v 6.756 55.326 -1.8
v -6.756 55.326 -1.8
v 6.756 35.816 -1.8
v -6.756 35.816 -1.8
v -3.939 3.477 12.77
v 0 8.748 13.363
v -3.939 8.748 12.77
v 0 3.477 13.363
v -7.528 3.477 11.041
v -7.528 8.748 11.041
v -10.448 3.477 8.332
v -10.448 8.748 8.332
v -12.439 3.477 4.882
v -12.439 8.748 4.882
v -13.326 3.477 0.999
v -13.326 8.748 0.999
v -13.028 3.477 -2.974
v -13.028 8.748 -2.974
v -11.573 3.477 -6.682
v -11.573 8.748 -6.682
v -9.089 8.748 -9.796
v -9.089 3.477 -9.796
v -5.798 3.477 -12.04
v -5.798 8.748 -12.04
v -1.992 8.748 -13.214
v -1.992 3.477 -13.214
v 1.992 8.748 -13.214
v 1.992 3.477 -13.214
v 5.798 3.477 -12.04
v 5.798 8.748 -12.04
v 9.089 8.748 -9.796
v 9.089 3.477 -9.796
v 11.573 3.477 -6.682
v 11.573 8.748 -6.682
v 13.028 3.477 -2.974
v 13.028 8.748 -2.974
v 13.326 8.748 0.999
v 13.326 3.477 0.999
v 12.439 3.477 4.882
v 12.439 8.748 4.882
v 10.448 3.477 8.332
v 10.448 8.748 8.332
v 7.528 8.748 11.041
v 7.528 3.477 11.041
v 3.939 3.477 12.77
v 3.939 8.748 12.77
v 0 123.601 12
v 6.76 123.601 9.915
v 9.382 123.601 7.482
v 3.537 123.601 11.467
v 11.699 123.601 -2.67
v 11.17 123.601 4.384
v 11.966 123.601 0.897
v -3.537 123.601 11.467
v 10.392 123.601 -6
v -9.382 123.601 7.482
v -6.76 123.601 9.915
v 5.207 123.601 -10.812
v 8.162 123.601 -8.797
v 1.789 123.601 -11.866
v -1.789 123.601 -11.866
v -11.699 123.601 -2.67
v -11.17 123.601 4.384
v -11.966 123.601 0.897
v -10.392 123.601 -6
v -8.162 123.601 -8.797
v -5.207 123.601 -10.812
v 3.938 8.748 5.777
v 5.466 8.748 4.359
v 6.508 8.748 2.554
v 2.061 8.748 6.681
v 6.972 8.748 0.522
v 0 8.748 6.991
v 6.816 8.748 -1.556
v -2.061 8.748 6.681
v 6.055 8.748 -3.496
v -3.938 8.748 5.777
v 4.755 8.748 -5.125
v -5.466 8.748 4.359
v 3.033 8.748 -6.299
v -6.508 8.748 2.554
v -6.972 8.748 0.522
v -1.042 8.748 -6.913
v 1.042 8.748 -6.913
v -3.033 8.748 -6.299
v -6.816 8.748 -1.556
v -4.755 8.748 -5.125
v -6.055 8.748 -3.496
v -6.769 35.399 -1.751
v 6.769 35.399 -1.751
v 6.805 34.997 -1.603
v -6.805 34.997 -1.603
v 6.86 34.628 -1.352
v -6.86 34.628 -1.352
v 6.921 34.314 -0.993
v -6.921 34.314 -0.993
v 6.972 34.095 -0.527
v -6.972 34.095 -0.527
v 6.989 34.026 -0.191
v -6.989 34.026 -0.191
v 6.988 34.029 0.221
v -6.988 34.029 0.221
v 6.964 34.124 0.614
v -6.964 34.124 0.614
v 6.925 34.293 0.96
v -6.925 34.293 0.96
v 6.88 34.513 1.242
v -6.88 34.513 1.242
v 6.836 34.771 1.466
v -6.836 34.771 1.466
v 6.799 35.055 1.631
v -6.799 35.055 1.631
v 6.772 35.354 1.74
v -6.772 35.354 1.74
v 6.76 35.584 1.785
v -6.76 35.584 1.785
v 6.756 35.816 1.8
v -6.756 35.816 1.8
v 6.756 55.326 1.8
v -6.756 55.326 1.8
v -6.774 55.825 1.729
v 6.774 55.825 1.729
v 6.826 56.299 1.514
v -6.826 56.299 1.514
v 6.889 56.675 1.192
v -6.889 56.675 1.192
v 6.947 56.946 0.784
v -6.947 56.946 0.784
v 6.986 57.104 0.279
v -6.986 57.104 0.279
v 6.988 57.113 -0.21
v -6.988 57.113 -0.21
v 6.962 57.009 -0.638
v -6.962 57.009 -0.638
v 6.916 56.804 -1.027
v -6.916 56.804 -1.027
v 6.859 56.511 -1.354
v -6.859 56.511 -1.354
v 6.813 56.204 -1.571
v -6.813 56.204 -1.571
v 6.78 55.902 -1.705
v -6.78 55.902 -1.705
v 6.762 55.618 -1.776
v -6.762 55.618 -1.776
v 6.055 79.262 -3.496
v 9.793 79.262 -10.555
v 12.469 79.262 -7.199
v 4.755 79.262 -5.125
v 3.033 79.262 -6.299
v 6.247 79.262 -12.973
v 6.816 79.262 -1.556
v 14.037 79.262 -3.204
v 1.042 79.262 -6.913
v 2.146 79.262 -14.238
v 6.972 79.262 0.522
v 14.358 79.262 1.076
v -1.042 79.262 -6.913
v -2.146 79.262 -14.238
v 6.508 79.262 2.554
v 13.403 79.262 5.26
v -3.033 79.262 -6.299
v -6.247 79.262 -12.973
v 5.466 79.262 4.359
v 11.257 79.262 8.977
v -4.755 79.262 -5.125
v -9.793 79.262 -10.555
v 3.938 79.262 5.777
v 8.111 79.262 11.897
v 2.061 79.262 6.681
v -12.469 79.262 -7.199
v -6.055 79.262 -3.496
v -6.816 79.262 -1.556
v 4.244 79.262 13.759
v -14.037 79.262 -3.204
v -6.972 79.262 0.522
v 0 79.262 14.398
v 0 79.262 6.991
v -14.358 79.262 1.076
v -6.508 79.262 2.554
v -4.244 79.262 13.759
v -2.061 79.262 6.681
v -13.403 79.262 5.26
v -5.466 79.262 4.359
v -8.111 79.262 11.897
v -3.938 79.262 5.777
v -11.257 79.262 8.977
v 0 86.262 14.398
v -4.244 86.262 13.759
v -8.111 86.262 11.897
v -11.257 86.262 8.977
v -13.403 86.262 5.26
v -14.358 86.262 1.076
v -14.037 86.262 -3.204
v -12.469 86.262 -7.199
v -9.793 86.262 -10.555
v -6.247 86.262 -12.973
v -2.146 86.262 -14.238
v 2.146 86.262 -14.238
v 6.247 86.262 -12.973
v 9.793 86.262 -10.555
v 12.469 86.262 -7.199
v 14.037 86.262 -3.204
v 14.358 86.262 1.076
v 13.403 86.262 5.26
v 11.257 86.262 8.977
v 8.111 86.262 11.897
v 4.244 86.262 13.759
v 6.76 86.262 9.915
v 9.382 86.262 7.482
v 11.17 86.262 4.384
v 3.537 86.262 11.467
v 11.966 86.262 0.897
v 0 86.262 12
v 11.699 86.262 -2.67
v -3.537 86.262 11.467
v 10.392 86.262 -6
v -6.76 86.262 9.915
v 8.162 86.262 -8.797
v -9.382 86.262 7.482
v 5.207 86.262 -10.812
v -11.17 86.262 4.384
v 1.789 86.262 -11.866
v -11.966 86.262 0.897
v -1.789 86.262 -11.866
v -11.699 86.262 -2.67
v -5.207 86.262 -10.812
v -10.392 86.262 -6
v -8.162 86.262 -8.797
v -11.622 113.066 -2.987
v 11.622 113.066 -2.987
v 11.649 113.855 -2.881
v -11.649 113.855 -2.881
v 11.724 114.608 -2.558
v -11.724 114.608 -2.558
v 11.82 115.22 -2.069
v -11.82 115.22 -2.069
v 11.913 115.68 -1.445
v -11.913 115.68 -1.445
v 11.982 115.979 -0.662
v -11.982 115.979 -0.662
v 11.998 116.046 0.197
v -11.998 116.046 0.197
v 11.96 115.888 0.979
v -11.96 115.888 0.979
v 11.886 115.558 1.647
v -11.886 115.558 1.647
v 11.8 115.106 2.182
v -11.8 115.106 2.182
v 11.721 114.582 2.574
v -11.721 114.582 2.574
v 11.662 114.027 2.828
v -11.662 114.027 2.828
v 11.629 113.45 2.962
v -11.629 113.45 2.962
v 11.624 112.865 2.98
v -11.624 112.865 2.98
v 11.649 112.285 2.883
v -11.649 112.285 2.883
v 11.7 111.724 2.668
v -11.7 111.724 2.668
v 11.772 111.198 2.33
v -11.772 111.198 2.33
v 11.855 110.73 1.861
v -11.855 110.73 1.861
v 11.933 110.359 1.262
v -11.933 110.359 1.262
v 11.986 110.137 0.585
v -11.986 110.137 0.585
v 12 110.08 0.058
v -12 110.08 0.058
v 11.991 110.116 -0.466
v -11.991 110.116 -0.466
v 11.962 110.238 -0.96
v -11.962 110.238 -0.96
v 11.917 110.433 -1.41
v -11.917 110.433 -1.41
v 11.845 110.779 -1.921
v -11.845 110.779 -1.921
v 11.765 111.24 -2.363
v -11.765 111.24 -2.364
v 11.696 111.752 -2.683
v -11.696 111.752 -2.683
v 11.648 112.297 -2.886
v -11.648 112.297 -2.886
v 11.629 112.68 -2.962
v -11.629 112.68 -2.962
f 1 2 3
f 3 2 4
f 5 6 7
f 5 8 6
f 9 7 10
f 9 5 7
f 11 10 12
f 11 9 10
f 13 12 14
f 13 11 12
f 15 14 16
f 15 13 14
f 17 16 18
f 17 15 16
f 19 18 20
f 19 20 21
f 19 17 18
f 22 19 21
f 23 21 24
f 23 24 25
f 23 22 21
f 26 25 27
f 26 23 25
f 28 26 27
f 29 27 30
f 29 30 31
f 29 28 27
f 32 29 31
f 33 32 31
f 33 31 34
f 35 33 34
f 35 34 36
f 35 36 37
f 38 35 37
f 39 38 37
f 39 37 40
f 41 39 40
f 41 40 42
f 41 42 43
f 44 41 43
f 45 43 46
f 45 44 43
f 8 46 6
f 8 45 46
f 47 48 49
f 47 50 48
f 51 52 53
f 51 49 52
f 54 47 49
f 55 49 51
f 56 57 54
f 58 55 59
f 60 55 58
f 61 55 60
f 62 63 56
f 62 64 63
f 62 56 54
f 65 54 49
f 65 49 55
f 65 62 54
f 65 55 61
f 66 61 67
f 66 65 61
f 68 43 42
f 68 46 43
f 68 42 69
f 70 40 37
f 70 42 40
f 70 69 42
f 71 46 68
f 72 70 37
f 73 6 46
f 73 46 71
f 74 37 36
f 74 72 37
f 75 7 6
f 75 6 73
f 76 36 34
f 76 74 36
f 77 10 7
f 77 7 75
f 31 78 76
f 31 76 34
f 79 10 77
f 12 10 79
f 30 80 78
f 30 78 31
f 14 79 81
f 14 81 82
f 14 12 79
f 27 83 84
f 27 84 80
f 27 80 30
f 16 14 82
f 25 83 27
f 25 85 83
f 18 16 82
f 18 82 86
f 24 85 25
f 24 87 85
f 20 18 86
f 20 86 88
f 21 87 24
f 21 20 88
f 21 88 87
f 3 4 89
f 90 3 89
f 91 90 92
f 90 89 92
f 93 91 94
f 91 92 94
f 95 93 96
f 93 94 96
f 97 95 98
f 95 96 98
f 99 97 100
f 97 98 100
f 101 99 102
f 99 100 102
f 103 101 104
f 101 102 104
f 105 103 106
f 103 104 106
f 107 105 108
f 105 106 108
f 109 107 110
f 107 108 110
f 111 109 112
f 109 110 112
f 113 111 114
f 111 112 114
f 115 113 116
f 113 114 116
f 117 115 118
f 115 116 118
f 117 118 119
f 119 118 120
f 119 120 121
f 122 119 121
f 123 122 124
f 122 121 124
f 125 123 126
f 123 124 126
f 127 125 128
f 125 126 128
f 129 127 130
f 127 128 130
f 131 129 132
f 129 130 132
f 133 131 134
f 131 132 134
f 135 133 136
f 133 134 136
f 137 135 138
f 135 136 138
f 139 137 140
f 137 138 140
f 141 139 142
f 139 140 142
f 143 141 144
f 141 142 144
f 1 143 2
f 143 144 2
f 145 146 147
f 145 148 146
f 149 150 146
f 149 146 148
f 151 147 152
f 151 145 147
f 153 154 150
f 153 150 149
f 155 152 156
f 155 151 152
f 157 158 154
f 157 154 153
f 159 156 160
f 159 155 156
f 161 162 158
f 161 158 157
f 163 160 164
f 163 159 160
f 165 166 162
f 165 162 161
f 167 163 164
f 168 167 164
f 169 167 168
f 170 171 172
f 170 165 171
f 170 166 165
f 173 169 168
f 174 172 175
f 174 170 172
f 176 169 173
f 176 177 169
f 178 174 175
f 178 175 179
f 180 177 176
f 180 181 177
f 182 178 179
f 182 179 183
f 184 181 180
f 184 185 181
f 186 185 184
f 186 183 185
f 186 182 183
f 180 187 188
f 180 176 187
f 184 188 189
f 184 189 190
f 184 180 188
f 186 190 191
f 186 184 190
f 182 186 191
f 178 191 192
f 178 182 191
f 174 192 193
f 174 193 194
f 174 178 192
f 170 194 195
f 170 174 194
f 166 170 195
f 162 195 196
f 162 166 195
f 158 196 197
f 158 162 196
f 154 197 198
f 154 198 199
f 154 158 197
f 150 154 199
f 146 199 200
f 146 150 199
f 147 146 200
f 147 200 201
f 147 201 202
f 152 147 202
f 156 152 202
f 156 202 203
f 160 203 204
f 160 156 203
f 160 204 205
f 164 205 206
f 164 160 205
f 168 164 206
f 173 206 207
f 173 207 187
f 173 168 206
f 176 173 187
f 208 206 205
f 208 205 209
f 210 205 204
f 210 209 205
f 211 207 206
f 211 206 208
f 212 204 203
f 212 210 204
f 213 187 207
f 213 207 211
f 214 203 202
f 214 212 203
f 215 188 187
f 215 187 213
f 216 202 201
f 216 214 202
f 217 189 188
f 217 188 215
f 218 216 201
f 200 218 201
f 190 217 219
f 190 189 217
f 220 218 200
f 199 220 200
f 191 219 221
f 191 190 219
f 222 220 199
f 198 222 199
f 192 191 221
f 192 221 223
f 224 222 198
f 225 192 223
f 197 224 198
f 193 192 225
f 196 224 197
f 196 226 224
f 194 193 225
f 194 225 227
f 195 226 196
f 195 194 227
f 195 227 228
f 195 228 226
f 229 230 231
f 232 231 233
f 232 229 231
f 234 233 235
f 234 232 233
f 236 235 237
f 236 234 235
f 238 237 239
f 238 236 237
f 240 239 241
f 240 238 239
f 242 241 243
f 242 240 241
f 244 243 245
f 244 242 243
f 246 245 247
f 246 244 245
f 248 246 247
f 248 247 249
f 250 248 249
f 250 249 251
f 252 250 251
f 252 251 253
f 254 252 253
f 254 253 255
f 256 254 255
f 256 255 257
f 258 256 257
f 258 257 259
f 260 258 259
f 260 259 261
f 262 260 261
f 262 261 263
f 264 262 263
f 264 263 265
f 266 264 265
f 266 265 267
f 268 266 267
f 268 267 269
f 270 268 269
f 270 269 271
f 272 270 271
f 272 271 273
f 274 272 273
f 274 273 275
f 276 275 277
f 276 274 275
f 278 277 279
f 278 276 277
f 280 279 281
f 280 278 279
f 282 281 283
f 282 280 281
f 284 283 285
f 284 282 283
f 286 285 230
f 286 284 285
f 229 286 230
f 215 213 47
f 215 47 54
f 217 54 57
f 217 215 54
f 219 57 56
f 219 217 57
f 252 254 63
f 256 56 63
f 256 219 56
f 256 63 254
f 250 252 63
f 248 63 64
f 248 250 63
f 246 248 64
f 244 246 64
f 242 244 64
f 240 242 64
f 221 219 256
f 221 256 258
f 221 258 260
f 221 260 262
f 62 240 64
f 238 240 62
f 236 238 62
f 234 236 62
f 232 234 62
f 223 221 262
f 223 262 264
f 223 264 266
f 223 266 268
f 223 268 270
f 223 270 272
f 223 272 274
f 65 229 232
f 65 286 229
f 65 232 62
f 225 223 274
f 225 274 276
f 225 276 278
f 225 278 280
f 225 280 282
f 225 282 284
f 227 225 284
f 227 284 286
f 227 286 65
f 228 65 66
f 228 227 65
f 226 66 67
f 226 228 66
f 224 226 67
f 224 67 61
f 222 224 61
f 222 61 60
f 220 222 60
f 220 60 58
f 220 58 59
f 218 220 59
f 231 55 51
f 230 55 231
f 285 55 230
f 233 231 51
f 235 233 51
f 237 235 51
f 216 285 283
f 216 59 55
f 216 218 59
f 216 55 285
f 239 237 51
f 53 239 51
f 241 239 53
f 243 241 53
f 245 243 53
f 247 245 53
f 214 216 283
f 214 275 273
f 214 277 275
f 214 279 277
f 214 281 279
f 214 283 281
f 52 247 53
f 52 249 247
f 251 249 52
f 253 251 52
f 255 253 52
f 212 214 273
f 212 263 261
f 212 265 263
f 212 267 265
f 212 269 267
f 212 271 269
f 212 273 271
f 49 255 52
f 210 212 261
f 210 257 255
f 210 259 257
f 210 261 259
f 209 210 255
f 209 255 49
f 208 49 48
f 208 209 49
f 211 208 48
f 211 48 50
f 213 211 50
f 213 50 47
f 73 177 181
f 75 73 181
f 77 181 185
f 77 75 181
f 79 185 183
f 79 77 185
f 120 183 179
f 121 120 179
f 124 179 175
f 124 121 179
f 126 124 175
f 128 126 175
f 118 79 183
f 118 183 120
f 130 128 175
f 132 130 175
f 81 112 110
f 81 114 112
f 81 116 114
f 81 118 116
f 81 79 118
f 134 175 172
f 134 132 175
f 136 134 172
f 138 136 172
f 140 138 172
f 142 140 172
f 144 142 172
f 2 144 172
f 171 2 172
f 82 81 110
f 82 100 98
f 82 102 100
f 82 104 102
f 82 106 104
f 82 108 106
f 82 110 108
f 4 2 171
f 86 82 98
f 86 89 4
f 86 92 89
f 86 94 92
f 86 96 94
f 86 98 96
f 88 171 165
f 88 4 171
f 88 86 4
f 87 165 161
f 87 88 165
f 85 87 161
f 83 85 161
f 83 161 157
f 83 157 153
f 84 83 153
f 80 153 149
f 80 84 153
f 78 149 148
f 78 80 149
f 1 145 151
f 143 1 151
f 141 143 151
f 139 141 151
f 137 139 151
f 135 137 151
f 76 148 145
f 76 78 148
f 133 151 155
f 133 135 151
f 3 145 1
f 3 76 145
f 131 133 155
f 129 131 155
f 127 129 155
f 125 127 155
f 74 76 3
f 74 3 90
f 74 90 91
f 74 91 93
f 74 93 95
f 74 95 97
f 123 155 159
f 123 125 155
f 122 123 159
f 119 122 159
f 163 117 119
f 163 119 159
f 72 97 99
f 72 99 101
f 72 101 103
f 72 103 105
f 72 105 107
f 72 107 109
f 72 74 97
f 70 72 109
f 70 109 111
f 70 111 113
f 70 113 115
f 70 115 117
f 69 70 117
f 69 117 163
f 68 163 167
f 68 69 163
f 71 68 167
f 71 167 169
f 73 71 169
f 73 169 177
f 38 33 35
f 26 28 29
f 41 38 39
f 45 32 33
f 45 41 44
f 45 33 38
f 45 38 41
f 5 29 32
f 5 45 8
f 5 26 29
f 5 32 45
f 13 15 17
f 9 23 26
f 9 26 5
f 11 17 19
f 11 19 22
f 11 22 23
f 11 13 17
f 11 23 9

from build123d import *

# Parameters (mm, degrees)
CUT_EXTRUDE1_DEPTH      = 126.267501457
CUT_EXTRUDE1_DEPTH_BACK = 126.267501457
SKETCH2_R               = 2.986936388
CUT_EXTRUDE2_DEPTH      = 126.267501556
CUT_EXTRUDE2_DEPTH_BACK = 126.267501556


with BuildPart() as part:
    # Sketch1 → Revolve1 (revolve)
    with BuildSketch(Plane(origin=(0, 0, 0), x_dir=(0, 0, -1), z_dir=(1, 0, 0)), mode=Mode.PRIVATE) as revolve1_sk:
        Polygon((0, 123.60144971), (12, 123.60144971), (12, 86.261621461), (14.398412253, 86.261621461), (14.398412253, 79.261621461), (6.991481123, 79.261621461), (6.991481123, 8.748152398), (13.363236745, 8.748152398), (13.363236745, 3.47746721), (0, 3.47746721), align=None)
    revolve(revolve1_sk.sketch.rotate(Axis((0, 123.60144971, 0), (0, -1, 0)), 180), axis=Axis((0, 123.60144971, 0), (0, -1, 0)))

    # Sketch2 → Cut-Extrude1 (cut, two sides: drawn at the far end of the back side and taken through both)
    with BuildSketch(Plane(origin=(0, 0, 0), x_dir=(0, 0, -1), z_dir=(1, 0, 0)).offset(-CUT_EXTRUDE1_DEPTH_BACK)):
        with Locations((0, 113.066011559)):
            Circle(SKETCH2_R)
    extrude(amount=CUT_EXTRUDE1_DEPTH + CUT_EXTRUDE1_DEPTH_BACK, mode=Mode.SUBTRACT)

    # Sketch3 → Cut-Extrude2 (cut, two sides: drawn at the far end of the back side and taken through both)
    with BuildSketch(Plane(origin=(0, 0, 0), x_dir=(0, 0, -1), z_dir=(1, 0, 0)).offset(-CUT_EXTRUDE2_DEPTH_BACK)):
        with BuildLine():
            Line((1.8, 55.325549997), (1.8, 35.81578841))
            ThreePointArc((1.8, 35.81578841), (0, 34.01578841), (-1.8, 35.81578841))
            Line((-1.8, 35.81578841), (-1.8, 55.325549997))
            ThreePointArc((-1.8, 55.325549997), (0, 57.125549997), (1.8, 55.325549997))
        make_face()
    extrude(amount=CUT_EXTRUDE2_DEPTH + CUT_EXTRUDE2_DEPTH_BACK, mode=Mode.SUBTRACT)


solid = part.part
